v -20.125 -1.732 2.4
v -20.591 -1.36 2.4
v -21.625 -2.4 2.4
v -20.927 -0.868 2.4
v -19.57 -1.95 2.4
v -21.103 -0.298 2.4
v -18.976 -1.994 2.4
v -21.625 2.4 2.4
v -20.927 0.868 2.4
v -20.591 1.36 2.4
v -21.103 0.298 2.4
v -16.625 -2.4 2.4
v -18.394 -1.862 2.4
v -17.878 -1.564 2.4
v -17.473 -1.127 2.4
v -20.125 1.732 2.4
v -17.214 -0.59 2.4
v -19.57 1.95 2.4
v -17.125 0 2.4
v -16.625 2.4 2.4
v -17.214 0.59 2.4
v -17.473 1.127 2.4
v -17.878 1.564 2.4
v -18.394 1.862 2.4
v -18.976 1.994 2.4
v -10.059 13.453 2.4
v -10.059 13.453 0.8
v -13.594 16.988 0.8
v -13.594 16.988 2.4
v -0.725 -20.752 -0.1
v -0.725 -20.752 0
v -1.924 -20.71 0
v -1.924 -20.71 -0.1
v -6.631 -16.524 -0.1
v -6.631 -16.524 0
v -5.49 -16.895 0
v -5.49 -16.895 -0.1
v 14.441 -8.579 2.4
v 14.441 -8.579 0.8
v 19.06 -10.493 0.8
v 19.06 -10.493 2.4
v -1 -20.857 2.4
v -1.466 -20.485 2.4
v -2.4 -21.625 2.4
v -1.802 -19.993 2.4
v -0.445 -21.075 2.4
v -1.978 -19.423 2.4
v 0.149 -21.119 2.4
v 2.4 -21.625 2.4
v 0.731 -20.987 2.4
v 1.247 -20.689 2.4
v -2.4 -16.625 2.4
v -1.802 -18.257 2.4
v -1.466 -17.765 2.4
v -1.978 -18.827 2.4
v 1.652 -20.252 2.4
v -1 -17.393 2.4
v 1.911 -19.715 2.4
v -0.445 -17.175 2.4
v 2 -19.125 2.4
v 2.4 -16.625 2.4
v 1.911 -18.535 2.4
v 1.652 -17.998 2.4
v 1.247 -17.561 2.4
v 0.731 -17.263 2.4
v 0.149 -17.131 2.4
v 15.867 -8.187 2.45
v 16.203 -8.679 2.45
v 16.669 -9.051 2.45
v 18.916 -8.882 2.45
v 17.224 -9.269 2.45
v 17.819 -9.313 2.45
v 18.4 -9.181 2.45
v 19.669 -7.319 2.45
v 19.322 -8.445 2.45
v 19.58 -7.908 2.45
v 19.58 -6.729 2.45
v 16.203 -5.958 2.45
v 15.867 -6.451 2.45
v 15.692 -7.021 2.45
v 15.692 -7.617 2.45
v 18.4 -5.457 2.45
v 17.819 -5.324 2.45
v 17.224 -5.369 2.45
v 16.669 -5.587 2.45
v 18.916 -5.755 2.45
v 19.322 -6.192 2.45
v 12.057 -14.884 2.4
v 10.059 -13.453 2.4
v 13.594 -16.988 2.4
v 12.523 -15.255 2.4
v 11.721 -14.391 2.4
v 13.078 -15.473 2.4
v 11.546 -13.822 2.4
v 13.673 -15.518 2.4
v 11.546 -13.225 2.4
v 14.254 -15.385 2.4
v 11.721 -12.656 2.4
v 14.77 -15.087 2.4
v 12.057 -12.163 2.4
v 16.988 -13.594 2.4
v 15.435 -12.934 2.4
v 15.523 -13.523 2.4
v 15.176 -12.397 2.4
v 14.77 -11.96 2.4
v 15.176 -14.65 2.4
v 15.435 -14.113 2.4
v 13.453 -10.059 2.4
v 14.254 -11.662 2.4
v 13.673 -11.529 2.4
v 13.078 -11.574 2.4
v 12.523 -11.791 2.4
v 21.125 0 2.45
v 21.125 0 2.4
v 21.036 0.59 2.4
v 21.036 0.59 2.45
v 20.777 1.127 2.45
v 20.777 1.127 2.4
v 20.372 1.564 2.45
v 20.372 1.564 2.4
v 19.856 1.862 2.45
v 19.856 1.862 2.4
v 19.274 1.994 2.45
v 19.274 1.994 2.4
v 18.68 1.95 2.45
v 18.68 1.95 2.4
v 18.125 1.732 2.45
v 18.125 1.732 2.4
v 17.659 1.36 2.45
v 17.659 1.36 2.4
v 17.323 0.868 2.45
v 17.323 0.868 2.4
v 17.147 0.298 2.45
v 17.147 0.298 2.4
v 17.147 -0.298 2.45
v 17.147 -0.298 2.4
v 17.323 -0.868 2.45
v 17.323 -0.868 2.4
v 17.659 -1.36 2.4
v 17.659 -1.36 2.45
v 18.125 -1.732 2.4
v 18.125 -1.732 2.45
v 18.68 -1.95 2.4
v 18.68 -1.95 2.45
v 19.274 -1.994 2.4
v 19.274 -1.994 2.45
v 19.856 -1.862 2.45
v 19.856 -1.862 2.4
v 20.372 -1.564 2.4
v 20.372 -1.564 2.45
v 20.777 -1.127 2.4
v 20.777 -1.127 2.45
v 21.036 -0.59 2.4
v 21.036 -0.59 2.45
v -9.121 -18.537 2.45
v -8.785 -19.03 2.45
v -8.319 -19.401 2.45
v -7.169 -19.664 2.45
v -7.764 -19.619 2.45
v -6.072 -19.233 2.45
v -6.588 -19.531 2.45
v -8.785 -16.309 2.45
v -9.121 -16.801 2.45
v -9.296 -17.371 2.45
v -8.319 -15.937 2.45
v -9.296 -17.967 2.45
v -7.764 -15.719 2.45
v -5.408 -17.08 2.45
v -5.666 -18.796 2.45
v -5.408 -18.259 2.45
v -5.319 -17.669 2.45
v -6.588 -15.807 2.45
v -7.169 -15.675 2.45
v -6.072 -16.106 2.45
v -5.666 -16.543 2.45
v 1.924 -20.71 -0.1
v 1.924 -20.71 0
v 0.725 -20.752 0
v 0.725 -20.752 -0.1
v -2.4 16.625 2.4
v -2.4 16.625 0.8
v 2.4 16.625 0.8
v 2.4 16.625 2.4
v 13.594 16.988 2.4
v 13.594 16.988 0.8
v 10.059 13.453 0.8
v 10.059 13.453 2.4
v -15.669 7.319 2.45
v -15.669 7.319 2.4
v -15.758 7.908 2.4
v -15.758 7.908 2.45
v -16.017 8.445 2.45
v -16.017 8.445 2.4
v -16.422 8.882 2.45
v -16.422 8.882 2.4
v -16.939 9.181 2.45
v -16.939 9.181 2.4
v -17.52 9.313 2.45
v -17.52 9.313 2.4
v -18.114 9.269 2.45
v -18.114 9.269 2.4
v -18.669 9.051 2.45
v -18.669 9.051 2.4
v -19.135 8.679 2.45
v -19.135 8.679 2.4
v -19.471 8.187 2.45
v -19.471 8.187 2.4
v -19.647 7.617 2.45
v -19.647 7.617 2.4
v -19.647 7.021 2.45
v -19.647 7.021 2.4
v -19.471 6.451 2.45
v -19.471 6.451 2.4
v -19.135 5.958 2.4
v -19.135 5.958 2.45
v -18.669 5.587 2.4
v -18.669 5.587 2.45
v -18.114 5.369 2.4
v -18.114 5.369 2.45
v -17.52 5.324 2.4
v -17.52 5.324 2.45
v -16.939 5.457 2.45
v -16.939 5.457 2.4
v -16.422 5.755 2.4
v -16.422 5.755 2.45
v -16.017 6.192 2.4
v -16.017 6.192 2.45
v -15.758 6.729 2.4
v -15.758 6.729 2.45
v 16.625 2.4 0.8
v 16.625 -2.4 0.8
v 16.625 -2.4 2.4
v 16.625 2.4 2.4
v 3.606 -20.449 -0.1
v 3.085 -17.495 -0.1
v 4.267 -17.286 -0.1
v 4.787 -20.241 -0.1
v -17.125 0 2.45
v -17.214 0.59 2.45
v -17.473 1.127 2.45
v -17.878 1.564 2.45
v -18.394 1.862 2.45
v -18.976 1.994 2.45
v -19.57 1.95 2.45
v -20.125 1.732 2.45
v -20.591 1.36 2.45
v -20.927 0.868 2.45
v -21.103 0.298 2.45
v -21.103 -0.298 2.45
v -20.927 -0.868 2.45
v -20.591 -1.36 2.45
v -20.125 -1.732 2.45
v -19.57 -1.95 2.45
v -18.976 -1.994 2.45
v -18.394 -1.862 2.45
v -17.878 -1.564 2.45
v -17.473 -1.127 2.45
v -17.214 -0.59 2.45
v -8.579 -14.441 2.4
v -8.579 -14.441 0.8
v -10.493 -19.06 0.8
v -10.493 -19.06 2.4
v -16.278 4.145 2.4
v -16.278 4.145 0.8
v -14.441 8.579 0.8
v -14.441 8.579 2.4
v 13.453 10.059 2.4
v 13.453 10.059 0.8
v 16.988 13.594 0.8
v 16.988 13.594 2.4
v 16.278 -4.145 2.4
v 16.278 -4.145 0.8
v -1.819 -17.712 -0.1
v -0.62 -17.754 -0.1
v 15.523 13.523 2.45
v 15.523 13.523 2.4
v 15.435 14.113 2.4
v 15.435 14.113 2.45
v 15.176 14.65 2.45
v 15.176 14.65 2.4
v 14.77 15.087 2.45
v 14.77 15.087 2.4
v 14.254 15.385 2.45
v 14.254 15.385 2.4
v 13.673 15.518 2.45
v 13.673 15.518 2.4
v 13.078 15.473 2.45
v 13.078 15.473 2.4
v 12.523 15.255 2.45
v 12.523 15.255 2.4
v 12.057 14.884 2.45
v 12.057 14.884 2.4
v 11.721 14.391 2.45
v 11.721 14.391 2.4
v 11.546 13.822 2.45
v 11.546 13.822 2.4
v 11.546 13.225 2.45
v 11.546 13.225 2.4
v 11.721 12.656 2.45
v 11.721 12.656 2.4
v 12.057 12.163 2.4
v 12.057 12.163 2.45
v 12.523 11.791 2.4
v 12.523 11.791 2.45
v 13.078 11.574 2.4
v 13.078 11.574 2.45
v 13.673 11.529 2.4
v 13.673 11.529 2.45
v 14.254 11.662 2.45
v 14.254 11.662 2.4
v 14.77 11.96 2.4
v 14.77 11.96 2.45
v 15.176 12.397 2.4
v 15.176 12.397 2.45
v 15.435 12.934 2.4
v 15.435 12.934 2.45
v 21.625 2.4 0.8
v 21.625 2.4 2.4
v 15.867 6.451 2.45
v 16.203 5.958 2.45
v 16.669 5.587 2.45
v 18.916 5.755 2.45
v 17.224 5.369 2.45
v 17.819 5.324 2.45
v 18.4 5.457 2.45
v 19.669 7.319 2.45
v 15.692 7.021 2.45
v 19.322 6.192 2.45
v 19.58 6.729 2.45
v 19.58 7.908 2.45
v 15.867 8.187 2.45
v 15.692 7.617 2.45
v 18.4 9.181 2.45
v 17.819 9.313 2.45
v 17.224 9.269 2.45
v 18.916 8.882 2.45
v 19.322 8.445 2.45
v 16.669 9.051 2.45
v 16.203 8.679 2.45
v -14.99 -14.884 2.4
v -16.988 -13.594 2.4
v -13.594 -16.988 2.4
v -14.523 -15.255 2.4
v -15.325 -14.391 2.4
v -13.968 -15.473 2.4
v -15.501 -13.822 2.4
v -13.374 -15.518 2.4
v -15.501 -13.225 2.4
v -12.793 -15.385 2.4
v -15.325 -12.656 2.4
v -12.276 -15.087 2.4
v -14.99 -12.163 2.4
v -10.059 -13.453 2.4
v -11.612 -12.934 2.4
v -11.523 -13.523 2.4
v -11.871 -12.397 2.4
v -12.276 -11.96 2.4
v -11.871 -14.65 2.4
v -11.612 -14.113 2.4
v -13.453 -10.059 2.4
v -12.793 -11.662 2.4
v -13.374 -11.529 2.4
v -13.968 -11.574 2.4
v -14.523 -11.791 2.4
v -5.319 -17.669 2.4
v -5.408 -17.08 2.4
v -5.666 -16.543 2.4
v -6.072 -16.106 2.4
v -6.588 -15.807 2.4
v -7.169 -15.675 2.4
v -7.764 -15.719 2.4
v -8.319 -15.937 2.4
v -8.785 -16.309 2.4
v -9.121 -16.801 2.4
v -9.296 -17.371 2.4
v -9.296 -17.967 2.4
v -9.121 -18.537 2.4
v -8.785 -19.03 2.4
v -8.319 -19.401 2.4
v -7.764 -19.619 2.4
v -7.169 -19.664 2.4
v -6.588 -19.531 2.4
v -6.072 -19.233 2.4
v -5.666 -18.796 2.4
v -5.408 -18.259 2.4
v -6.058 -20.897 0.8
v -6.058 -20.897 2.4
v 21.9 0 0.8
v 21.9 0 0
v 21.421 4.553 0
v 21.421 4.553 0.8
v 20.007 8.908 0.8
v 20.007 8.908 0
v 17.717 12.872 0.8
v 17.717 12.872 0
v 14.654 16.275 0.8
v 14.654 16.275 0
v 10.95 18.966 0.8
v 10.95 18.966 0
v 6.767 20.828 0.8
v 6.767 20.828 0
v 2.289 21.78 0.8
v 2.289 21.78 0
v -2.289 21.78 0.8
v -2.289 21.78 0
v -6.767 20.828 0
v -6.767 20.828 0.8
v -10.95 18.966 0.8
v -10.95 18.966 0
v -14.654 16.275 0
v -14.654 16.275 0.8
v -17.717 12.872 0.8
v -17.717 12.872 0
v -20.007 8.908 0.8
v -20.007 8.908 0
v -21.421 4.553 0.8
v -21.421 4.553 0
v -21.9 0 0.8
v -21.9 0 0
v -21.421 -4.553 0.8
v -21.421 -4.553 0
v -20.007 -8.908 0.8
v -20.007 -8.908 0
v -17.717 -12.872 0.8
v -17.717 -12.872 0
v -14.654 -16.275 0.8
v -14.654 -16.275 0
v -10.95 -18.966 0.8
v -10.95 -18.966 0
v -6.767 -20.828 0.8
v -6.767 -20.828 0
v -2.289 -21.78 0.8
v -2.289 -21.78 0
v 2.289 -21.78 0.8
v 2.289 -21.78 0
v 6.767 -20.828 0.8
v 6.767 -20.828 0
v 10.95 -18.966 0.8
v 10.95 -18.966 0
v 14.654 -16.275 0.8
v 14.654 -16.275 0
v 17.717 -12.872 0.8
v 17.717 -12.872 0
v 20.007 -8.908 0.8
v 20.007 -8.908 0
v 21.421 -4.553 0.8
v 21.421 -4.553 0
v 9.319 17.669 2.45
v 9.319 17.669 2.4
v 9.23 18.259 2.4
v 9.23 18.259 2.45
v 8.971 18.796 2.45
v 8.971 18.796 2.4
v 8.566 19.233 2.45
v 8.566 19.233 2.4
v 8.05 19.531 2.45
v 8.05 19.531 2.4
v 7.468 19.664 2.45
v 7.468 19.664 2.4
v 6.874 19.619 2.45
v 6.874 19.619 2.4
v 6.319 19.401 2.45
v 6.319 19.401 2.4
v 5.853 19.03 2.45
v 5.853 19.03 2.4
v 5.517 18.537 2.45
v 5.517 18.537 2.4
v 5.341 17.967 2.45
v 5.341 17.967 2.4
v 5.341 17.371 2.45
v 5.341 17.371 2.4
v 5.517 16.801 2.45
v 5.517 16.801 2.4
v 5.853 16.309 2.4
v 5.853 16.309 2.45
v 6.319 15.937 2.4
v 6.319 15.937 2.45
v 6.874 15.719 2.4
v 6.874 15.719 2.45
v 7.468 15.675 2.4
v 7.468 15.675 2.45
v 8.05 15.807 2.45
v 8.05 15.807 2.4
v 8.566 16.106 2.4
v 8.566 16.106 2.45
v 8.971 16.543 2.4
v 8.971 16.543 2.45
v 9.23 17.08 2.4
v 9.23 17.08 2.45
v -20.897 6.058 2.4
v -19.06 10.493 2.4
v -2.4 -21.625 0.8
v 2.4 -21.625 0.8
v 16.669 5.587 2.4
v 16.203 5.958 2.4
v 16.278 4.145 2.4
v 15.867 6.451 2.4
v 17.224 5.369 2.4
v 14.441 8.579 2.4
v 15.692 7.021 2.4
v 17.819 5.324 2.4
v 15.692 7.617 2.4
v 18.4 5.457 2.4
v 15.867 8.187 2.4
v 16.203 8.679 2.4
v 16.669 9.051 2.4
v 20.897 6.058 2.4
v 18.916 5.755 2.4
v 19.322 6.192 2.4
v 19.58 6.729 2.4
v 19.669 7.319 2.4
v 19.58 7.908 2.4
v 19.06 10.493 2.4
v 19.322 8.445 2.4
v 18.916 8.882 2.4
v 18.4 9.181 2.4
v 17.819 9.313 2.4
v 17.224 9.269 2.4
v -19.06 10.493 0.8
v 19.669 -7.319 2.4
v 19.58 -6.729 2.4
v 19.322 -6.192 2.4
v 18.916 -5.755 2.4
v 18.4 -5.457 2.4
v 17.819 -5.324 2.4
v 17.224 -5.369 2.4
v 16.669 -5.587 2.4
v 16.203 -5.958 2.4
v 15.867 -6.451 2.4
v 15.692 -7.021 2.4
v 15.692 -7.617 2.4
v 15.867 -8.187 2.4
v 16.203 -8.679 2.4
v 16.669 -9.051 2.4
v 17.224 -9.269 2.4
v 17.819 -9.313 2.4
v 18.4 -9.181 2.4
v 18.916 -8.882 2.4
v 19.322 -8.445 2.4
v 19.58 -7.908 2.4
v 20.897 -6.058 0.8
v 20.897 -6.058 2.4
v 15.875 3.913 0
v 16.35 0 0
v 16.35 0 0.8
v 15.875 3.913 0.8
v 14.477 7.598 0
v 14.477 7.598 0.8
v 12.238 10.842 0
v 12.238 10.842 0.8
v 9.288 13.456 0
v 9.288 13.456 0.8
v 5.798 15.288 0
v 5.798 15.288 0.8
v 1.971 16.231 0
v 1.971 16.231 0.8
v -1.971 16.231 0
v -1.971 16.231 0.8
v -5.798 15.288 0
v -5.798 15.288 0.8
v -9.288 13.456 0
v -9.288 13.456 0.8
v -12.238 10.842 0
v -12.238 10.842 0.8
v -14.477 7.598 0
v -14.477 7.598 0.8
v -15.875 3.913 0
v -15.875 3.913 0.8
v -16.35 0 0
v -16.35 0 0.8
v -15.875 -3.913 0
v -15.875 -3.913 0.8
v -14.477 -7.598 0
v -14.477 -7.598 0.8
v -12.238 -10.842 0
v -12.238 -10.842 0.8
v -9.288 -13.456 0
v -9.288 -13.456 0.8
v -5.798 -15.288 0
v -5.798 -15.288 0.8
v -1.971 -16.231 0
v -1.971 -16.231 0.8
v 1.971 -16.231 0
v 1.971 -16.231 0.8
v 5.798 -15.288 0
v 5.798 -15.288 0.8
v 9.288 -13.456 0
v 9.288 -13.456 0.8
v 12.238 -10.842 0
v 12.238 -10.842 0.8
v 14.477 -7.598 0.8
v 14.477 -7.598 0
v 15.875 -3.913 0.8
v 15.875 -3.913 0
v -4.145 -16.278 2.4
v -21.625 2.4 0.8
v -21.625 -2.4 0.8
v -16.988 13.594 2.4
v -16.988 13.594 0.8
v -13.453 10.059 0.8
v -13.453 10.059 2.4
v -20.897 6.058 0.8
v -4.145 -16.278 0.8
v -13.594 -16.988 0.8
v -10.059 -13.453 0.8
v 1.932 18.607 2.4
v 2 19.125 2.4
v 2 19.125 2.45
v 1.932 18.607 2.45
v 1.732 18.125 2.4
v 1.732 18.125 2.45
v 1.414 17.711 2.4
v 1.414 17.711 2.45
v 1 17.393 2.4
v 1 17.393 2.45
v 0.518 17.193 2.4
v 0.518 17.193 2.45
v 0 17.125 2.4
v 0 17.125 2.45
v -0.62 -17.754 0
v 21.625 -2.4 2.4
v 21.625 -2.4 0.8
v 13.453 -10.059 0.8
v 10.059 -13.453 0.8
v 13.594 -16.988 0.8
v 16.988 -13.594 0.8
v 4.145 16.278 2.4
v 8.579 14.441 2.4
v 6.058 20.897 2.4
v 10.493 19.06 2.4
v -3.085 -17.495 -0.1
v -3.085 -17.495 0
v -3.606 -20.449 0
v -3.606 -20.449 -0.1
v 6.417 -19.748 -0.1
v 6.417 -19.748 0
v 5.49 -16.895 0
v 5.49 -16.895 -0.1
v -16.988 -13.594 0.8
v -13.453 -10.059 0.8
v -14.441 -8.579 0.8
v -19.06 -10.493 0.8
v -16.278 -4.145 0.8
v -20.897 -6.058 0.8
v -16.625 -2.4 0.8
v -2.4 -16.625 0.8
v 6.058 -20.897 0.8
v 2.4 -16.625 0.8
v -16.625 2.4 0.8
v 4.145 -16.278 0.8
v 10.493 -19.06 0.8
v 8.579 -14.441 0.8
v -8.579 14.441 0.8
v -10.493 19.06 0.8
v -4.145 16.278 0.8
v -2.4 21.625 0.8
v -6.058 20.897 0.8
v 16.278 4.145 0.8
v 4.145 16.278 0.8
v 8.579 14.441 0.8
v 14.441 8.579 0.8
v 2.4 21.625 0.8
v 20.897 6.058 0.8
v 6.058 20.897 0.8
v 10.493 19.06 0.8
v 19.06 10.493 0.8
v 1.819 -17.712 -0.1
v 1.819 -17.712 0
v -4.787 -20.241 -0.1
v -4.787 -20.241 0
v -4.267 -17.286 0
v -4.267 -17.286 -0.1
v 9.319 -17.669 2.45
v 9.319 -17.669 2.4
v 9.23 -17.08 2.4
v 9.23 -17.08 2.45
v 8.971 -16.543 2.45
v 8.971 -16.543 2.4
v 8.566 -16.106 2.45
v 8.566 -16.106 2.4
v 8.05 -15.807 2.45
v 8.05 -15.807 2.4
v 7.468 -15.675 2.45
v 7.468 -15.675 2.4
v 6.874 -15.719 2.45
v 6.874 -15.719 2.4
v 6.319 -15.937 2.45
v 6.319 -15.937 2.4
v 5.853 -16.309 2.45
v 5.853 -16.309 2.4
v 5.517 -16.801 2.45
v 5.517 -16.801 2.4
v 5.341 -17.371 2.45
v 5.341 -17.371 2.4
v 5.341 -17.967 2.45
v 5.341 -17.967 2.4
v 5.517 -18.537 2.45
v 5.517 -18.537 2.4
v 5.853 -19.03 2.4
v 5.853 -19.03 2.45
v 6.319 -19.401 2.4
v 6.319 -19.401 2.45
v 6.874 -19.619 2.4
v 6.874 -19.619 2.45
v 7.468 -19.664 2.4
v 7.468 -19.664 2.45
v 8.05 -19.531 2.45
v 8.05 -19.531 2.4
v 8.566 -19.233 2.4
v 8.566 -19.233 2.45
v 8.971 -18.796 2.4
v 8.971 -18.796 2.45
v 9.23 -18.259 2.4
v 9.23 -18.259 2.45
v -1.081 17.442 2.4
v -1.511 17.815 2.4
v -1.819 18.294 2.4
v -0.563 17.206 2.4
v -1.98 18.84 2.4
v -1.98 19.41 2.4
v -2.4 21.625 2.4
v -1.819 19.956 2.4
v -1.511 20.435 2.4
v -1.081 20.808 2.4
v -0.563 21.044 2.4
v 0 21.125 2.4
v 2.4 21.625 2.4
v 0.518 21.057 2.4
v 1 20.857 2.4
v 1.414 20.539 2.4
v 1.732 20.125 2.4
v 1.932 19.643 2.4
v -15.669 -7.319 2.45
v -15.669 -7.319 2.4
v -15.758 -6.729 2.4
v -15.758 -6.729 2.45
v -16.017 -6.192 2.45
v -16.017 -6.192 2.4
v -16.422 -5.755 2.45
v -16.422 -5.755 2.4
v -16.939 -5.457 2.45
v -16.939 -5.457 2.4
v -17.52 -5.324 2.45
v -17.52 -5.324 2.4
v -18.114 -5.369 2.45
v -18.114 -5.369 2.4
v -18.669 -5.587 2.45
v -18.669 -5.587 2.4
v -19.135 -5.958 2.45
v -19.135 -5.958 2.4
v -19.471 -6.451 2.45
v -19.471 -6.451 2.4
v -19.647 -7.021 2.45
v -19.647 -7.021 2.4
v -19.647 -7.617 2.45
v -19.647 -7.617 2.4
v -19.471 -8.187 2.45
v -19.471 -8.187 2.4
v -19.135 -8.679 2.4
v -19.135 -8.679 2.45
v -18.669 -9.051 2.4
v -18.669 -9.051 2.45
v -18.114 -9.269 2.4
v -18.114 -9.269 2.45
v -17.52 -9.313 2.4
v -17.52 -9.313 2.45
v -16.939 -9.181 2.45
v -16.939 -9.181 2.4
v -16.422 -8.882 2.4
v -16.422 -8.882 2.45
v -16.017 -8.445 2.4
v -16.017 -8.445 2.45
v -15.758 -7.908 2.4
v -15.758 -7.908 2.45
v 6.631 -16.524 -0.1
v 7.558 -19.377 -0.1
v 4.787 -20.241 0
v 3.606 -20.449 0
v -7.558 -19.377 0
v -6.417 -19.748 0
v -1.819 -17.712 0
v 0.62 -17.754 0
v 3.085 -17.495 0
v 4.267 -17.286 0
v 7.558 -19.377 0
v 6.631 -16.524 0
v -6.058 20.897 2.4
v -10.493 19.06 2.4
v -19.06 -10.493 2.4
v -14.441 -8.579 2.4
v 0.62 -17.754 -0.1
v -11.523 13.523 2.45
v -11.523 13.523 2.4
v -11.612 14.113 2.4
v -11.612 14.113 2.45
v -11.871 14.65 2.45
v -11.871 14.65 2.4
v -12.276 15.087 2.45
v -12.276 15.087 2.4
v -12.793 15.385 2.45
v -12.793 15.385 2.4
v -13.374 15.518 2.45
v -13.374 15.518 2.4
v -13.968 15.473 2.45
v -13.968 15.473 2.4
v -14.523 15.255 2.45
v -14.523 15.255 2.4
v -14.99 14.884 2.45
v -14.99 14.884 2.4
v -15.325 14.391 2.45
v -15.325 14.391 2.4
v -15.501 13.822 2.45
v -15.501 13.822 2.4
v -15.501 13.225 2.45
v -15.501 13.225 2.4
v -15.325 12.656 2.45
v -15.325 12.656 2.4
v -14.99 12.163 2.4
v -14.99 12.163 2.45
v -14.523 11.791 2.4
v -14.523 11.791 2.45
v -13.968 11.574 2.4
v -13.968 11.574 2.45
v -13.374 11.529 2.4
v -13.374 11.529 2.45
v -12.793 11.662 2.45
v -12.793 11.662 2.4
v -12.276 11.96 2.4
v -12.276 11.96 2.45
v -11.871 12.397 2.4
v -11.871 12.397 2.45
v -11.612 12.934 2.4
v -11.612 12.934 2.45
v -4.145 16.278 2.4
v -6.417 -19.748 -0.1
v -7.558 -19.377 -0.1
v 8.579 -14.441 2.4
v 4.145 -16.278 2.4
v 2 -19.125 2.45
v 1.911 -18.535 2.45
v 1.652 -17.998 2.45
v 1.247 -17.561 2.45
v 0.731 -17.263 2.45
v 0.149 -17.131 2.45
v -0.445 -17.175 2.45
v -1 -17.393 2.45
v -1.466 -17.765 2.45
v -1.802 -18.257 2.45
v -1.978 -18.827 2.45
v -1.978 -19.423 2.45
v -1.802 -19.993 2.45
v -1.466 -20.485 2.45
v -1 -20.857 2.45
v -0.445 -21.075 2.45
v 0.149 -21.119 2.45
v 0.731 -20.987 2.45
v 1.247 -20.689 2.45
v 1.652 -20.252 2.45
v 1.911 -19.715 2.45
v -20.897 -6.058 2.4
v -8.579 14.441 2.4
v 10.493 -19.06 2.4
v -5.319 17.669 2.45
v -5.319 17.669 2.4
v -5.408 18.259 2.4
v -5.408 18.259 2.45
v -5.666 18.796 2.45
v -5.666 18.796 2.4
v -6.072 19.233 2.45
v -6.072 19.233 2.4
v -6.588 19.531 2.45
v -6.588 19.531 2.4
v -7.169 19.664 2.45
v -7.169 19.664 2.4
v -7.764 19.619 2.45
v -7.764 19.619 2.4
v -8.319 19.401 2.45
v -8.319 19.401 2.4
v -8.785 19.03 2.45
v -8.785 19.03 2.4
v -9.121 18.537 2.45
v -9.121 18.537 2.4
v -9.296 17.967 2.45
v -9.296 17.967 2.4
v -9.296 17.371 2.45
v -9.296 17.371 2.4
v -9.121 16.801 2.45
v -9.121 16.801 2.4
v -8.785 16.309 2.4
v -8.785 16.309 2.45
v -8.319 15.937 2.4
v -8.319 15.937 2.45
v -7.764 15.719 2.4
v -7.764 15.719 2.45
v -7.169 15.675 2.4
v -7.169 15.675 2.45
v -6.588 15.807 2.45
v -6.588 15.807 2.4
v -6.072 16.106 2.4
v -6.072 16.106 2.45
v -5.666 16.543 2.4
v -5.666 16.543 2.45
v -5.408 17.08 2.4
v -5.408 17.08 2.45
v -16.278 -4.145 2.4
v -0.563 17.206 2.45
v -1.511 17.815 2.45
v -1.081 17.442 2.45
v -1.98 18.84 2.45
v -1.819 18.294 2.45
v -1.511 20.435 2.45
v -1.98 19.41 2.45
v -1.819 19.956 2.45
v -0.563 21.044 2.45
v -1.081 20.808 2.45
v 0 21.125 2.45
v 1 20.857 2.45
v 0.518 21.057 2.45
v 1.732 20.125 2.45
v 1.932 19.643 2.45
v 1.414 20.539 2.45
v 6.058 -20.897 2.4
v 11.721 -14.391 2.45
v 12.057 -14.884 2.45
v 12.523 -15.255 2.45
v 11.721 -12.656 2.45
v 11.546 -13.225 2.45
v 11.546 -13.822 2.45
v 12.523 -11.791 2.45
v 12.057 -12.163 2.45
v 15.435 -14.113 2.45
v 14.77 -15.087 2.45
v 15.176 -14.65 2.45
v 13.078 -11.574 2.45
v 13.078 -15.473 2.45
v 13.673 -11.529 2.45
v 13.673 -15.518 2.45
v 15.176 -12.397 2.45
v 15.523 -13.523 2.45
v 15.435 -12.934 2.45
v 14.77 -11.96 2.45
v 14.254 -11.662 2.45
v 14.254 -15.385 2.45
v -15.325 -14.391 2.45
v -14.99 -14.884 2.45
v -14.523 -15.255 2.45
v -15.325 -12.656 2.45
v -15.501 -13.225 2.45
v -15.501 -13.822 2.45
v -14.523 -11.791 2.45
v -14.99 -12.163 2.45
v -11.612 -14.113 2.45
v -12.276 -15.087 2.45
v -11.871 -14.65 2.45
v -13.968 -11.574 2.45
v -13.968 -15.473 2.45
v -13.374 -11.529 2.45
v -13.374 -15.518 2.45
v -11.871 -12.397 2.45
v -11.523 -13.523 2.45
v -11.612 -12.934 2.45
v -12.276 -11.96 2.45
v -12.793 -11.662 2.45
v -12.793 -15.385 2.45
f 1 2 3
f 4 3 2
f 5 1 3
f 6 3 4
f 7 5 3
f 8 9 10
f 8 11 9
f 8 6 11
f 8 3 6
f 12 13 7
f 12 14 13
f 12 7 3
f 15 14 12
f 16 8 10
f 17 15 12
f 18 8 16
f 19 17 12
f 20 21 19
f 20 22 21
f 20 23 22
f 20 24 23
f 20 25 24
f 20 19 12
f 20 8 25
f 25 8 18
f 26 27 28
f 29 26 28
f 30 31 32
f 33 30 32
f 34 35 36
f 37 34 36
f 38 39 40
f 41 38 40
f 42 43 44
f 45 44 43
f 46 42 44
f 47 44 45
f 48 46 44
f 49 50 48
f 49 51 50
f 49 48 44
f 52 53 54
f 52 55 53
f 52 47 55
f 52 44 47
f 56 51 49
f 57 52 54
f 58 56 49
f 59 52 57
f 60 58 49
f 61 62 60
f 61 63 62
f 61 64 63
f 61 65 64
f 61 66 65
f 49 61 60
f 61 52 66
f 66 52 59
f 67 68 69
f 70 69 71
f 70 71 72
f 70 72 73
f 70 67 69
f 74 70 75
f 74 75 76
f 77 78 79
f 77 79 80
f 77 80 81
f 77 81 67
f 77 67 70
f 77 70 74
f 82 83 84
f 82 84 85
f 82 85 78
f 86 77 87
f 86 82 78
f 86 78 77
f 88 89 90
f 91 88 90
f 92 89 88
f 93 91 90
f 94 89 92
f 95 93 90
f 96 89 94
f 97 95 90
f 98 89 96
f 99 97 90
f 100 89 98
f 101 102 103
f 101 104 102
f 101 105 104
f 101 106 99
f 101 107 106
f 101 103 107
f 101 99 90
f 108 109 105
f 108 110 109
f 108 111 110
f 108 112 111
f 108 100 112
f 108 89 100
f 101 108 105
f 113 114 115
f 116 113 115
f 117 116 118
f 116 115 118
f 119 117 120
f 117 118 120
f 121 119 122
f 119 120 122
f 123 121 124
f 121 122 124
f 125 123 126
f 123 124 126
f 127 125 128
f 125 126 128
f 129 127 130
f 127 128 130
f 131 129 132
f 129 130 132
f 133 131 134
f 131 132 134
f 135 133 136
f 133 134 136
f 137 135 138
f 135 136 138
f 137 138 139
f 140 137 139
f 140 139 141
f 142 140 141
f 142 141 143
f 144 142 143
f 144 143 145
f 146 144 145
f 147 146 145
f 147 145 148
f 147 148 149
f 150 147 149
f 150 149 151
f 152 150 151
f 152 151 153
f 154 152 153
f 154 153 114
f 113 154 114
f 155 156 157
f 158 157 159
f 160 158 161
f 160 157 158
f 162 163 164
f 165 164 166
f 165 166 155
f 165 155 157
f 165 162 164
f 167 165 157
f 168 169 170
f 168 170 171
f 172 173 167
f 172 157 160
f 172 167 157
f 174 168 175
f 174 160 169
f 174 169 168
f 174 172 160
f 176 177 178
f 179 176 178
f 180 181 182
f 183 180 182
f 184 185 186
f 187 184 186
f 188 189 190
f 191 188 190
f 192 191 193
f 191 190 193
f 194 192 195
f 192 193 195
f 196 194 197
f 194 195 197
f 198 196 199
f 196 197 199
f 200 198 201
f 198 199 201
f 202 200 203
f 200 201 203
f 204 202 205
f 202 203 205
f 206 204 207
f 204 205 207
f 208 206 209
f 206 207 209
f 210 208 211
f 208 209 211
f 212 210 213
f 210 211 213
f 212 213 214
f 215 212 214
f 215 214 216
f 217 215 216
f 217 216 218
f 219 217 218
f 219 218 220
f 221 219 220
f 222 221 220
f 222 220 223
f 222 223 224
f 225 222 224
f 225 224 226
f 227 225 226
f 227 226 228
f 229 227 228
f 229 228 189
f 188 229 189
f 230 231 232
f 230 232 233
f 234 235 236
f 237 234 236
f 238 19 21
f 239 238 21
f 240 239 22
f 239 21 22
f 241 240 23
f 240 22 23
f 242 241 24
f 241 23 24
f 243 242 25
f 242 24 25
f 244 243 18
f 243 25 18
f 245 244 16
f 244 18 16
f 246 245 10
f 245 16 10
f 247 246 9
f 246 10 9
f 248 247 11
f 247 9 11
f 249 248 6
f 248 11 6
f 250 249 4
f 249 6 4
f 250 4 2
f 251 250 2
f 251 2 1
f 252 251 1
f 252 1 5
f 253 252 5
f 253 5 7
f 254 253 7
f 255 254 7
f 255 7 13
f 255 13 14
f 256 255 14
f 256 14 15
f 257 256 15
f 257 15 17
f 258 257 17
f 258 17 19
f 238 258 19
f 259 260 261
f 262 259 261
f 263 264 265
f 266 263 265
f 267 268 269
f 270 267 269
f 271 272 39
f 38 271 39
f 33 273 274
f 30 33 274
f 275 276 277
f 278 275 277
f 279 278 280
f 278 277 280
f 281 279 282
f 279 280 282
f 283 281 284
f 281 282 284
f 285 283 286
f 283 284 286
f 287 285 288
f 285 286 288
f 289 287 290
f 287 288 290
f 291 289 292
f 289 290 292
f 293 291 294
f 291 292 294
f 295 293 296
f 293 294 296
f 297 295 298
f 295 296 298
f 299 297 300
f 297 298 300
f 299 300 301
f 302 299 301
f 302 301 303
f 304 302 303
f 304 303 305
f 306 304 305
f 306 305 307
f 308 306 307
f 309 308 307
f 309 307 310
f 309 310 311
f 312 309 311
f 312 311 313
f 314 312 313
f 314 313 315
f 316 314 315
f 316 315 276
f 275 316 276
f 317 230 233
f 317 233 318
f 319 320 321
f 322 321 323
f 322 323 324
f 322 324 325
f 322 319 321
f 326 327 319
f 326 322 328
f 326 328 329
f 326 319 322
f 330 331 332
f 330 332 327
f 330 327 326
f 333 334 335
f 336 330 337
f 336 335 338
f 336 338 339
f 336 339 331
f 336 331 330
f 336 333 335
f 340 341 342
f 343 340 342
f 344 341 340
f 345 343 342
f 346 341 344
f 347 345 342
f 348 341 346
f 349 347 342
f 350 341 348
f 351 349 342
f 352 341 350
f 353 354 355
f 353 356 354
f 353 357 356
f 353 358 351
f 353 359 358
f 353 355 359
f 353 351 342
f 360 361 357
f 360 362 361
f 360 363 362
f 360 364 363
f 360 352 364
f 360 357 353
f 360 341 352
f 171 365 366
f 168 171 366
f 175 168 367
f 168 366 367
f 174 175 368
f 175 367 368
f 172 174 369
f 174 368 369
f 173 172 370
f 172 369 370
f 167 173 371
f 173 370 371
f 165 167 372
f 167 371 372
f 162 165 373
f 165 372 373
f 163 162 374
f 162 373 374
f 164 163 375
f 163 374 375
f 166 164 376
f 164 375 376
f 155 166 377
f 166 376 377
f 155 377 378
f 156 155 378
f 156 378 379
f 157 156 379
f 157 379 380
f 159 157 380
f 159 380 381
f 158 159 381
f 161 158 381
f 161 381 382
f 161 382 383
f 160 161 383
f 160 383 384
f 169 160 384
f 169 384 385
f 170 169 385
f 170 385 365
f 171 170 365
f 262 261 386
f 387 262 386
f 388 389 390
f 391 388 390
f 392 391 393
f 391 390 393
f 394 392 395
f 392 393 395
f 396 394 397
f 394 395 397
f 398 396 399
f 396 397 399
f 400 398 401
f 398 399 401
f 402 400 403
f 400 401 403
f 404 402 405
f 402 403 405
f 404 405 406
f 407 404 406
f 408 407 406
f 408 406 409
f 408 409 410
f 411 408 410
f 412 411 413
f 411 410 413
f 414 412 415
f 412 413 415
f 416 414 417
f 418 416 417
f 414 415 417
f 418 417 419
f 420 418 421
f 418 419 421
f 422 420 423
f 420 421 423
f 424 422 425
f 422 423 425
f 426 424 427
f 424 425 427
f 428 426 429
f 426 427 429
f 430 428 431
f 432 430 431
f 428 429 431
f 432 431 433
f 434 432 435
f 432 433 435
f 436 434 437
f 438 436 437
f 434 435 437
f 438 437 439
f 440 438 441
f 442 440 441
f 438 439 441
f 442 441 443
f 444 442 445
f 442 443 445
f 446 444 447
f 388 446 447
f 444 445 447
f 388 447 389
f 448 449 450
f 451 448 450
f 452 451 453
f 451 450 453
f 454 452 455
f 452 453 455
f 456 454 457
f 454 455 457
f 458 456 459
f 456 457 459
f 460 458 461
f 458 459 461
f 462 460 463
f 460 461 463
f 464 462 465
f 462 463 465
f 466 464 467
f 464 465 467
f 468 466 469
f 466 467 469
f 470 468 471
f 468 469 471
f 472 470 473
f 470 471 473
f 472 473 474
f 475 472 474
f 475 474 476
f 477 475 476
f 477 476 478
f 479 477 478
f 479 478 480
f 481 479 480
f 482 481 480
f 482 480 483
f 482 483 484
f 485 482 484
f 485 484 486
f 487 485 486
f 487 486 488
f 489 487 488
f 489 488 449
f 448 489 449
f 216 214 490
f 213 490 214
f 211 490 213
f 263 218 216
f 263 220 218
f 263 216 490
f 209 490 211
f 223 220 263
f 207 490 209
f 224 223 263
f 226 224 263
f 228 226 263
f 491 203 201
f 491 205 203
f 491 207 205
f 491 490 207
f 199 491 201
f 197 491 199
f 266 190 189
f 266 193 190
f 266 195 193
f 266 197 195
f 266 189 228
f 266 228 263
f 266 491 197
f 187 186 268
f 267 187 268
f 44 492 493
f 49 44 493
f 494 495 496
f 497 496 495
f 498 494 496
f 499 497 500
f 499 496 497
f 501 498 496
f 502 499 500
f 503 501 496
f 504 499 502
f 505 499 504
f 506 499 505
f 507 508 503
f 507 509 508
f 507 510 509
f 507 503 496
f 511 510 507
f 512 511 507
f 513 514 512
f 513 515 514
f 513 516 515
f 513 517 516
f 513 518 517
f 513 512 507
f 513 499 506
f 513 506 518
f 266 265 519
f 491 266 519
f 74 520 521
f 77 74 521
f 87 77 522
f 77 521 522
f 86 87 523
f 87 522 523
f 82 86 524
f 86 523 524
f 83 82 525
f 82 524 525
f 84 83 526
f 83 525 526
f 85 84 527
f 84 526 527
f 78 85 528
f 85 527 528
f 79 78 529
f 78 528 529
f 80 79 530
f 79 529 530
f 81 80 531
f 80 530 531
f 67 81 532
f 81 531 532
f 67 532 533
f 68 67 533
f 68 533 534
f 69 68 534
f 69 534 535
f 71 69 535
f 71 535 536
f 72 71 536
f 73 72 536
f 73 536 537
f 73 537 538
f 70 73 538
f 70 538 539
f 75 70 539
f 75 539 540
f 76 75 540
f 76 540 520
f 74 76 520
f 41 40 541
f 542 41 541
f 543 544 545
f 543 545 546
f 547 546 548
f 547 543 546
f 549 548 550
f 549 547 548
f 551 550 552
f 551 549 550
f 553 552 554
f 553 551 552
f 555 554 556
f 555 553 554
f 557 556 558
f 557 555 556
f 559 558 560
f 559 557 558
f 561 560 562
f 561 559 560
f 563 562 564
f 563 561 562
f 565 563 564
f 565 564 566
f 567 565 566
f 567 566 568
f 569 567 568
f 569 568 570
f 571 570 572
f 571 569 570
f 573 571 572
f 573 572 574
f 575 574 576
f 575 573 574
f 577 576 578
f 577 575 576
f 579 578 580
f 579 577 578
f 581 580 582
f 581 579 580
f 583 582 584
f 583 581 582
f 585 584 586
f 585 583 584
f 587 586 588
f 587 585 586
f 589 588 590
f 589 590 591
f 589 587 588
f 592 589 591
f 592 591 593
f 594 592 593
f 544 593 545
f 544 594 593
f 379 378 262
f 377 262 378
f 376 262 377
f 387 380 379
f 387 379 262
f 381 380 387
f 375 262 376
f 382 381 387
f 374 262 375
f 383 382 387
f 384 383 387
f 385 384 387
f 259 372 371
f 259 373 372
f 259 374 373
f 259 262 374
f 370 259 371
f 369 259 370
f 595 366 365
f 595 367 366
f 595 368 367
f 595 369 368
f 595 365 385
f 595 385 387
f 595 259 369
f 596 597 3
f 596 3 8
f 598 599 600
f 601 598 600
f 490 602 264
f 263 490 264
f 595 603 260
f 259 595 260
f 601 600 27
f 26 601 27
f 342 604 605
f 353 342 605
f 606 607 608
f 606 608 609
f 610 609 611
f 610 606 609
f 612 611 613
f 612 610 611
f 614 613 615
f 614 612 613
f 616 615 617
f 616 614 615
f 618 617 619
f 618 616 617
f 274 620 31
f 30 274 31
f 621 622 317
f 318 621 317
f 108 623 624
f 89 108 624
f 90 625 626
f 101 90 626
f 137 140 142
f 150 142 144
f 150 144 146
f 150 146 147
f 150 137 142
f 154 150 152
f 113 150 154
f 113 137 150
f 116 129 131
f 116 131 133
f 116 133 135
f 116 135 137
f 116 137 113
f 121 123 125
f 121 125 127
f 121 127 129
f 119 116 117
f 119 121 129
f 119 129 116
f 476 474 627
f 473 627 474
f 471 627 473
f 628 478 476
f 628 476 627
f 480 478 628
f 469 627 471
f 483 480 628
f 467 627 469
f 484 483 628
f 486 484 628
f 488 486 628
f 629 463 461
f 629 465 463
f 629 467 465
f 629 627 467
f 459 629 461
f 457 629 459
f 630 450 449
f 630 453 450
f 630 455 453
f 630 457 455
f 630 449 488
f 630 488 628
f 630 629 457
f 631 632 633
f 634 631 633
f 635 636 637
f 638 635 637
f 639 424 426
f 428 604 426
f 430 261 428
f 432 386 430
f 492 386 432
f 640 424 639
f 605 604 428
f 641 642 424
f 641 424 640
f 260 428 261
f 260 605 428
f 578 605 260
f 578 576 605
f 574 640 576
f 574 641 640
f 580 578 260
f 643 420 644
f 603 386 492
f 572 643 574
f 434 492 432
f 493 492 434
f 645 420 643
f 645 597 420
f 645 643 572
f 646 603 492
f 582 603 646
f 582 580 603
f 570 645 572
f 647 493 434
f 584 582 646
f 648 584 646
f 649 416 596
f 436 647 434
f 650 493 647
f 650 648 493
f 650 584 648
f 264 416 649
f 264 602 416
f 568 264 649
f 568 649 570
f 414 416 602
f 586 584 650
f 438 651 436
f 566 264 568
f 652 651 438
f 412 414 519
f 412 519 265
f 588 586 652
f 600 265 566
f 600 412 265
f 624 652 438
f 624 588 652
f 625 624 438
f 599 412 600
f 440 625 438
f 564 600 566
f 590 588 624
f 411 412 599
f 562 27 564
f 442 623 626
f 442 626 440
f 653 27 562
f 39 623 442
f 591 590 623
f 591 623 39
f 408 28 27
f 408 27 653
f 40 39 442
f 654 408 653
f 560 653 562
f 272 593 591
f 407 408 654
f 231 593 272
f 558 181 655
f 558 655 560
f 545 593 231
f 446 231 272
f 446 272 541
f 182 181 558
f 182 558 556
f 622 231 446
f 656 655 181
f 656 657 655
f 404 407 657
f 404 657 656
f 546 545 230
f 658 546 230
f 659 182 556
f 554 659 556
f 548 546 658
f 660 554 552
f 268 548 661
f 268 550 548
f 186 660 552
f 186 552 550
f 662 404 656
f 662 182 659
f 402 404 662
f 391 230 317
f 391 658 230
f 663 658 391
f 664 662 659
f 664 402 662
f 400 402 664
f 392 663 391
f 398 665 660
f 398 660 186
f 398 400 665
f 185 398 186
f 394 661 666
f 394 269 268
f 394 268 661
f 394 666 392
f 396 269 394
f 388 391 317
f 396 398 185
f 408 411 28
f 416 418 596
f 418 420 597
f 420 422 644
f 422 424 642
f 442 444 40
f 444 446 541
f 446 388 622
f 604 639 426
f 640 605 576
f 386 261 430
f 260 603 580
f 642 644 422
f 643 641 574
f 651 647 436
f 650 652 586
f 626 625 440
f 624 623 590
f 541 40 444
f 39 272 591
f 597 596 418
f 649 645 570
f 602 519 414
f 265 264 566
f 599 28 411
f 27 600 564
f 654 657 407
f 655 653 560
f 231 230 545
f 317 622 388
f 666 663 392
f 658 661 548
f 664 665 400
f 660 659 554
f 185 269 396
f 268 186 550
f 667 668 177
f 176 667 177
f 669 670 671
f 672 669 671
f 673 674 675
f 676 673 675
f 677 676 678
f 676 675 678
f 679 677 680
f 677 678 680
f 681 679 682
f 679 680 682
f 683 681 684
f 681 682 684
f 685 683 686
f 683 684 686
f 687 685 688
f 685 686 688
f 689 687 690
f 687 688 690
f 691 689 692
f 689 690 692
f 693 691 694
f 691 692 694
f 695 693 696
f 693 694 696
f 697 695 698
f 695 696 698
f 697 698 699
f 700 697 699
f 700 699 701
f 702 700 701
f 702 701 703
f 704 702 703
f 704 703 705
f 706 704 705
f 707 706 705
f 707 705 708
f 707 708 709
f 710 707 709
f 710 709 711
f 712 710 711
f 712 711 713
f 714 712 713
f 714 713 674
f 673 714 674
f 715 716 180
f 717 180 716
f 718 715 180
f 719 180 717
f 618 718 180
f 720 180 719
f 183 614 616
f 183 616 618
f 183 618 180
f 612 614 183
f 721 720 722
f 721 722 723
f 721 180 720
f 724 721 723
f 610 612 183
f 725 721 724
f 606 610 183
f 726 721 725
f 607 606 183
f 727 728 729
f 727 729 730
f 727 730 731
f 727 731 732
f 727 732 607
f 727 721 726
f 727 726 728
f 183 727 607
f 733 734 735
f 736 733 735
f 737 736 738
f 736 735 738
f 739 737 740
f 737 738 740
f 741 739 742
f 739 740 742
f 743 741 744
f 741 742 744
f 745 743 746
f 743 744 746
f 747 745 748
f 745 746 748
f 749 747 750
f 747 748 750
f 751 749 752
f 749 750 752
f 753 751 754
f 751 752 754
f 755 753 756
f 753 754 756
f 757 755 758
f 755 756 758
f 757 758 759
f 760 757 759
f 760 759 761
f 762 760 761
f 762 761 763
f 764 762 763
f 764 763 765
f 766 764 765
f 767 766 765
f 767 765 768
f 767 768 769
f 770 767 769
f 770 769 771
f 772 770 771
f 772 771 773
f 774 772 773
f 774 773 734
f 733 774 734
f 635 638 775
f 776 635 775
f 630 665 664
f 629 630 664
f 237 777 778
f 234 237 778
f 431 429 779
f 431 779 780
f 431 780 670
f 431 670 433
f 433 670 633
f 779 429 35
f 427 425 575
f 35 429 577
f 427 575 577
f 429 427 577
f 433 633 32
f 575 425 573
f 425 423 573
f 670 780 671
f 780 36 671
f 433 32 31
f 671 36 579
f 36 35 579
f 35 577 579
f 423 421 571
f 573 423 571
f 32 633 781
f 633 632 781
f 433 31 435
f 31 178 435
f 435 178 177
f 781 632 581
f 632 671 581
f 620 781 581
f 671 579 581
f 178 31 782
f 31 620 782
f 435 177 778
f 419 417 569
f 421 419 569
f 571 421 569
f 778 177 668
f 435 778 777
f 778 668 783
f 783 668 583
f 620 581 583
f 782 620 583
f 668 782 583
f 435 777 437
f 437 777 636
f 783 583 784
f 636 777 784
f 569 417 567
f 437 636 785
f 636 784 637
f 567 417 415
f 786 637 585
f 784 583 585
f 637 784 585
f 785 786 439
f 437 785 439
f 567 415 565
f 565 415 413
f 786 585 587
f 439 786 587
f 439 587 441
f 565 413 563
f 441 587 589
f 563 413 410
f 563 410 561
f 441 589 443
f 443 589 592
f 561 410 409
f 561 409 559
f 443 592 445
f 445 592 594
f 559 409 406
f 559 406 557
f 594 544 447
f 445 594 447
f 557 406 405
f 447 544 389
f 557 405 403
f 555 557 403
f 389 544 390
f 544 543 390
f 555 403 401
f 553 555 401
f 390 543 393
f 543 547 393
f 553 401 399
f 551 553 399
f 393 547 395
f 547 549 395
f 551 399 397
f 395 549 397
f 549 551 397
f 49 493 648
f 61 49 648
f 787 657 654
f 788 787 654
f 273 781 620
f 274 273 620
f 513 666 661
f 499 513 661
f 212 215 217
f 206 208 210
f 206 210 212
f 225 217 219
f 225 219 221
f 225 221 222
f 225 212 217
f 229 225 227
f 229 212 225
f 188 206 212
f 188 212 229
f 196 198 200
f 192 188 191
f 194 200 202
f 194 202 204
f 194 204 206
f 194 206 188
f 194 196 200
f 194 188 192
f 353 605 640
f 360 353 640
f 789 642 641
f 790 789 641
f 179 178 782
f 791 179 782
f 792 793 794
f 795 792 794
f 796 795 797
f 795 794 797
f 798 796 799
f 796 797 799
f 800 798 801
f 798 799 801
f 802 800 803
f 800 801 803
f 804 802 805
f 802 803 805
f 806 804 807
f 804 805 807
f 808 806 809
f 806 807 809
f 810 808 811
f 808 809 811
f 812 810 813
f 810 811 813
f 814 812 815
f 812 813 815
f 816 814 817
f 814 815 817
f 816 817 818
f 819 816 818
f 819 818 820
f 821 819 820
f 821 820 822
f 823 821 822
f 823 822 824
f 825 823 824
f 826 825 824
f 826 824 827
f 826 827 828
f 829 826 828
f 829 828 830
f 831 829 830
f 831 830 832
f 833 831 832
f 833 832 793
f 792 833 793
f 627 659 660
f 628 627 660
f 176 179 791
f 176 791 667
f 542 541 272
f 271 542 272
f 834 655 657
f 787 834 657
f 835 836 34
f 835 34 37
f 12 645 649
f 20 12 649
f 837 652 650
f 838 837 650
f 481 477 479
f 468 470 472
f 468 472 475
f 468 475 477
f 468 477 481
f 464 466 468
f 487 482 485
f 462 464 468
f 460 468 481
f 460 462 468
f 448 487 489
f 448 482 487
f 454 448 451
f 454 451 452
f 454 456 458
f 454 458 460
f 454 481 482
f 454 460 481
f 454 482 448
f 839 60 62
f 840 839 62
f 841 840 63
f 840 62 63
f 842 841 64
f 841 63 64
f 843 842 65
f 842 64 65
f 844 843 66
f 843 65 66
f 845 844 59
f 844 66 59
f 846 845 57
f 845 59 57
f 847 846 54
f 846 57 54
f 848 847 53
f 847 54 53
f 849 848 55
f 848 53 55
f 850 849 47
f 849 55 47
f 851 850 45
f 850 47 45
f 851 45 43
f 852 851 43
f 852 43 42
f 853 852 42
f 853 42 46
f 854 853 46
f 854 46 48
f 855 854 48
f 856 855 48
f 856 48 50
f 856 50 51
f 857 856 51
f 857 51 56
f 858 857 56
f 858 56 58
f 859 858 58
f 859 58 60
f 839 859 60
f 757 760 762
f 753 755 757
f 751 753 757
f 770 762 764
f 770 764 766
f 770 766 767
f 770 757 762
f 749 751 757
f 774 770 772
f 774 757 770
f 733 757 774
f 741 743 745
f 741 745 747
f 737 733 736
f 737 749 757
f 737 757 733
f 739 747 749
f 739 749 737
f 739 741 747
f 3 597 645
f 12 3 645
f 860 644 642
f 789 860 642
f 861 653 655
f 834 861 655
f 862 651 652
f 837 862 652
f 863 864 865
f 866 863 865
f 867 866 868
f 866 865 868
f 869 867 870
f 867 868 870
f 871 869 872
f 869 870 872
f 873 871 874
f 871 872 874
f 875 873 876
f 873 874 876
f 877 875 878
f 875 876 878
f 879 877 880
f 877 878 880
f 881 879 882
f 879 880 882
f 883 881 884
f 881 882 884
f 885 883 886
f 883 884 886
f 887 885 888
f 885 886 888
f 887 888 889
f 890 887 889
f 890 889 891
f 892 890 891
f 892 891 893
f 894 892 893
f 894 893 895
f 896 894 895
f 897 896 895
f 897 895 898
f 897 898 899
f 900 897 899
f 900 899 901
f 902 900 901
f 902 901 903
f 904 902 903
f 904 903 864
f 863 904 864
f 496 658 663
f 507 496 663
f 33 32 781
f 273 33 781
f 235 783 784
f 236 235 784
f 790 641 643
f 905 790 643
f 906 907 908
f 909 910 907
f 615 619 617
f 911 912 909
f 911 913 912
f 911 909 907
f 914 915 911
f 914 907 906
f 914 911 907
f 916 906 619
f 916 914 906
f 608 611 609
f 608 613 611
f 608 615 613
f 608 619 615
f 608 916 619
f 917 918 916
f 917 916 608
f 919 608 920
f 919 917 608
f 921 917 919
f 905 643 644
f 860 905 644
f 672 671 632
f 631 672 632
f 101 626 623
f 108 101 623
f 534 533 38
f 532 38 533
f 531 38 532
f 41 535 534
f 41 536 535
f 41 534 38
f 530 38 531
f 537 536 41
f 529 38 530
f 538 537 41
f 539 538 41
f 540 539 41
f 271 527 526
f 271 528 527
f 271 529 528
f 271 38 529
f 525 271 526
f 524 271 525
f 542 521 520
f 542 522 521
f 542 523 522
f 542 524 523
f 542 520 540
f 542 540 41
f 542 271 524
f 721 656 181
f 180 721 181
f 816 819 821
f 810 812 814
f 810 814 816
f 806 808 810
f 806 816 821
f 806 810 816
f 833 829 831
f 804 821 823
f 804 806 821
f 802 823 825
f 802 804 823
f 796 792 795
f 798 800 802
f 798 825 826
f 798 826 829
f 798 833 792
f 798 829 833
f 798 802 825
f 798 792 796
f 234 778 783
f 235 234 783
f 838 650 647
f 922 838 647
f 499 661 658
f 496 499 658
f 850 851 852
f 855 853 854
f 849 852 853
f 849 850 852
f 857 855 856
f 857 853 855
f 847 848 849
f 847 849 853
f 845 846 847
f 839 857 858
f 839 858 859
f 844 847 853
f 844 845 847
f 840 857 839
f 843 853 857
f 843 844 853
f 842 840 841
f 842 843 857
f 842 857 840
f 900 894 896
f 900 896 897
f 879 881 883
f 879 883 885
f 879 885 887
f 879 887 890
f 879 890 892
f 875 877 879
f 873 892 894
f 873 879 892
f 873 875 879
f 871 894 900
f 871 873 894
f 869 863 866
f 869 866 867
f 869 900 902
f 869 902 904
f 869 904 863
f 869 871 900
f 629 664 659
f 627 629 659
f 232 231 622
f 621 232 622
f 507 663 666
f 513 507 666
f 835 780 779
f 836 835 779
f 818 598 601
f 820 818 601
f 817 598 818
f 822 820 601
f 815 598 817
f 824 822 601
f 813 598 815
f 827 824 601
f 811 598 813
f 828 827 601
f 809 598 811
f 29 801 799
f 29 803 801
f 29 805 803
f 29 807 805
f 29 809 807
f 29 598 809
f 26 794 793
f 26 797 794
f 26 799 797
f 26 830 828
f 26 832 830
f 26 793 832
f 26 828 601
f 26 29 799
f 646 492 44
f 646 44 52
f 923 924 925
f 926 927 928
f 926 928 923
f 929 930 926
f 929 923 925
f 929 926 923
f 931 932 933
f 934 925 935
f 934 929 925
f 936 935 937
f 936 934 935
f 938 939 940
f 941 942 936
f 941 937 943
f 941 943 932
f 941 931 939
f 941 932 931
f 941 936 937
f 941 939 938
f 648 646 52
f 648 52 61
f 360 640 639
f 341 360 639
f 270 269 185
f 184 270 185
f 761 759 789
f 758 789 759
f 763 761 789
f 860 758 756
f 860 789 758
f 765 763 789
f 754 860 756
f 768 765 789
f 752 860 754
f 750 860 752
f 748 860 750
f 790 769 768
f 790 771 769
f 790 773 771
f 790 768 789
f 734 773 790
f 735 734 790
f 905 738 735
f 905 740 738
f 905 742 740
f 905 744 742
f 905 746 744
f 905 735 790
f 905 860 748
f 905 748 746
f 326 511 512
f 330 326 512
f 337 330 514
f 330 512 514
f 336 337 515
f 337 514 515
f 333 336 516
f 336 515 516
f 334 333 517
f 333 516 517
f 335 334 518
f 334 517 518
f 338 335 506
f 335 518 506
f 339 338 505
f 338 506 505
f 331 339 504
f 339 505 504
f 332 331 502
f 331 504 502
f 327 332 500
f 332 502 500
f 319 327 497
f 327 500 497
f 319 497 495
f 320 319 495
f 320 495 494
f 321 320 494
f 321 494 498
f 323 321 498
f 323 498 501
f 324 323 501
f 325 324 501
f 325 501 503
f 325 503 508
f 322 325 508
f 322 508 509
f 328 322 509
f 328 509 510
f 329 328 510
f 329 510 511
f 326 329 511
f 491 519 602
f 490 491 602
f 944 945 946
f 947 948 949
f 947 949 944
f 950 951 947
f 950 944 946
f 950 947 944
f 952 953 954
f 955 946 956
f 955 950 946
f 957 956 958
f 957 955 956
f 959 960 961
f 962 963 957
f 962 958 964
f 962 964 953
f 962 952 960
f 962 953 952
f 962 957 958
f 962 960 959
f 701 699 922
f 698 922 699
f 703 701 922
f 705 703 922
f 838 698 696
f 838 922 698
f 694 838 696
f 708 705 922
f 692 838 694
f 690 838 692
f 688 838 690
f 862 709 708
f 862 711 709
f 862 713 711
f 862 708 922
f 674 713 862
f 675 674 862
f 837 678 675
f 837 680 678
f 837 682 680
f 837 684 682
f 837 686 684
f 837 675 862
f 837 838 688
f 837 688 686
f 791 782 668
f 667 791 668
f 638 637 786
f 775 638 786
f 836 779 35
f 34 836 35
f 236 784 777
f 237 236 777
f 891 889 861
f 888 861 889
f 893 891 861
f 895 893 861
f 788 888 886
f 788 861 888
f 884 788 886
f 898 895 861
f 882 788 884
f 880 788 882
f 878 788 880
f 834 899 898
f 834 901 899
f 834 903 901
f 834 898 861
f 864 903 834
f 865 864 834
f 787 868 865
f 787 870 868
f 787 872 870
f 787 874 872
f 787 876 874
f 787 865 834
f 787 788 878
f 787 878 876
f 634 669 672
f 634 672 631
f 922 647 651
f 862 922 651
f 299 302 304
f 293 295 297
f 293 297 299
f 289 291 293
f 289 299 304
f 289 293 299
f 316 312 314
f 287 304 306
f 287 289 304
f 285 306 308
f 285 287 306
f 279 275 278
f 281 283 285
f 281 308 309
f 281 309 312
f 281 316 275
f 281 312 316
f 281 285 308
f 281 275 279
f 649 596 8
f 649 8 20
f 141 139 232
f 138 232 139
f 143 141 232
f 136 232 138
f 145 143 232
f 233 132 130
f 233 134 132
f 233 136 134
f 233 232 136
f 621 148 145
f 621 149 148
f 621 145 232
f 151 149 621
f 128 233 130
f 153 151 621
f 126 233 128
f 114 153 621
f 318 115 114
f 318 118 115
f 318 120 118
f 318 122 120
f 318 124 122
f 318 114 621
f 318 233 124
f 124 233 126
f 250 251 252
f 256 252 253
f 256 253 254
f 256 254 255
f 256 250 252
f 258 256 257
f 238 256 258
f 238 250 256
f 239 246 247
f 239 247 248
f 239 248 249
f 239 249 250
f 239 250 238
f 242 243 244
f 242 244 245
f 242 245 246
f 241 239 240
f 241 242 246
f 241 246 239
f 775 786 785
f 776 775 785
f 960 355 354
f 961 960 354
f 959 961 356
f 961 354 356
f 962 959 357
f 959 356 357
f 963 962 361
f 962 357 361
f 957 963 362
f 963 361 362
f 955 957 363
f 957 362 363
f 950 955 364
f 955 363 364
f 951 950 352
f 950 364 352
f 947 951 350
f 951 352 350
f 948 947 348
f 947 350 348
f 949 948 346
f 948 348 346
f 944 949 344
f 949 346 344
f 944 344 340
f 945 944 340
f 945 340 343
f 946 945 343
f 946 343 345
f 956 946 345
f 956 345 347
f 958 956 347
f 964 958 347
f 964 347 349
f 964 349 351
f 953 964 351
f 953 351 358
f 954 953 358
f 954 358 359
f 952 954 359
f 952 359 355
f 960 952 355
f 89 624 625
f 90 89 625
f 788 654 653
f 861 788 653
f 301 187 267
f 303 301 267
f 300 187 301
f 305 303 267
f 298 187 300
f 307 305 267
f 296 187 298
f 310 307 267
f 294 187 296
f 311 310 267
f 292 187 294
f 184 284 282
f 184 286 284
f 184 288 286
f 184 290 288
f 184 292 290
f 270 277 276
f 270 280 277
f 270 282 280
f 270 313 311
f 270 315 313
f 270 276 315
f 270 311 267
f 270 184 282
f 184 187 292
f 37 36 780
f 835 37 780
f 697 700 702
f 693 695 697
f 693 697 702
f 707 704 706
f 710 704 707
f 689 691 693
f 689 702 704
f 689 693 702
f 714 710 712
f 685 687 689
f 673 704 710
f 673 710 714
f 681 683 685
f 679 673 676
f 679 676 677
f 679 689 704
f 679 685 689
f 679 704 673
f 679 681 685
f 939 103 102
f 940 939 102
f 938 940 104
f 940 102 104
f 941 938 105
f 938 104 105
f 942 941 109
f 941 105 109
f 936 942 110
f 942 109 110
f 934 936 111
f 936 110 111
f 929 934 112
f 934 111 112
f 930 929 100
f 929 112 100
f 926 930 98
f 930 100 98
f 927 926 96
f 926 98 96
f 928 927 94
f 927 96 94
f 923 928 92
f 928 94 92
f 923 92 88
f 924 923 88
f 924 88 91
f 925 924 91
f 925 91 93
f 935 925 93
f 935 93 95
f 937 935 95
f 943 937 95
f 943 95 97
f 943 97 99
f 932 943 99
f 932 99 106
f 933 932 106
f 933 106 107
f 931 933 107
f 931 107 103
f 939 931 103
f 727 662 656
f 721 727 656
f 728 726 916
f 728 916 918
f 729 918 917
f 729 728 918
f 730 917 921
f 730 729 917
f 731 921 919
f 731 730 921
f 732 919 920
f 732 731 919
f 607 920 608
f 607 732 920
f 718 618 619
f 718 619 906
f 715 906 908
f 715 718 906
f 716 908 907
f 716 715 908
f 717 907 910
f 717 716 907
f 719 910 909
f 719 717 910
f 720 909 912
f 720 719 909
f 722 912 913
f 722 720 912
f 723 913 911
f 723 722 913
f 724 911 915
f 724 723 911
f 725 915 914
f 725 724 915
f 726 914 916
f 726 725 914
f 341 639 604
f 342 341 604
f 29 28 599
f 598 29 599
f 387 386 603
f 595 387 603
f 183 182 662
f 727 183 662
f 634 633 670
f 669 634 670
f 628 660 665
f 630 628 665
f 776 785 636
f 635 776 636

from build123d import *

# Parameters (mm, degrees)
F0_R     = 21.9
F0_R_2   = 16.35
F1_DEPTH = 0.8
F2_R     = 2
F2_W     = 5
F2_H     = 4.8
F2_W_2   = 4.8
F2_H_2   = 5
F3_DEPTH = 1.6
F4_DEPTH = 1.65
F6_DEPTH = 0.1


with BuildPart() as f1:
    # F0 (on Top) → F1 (new body)
    with BuildSketch(Plane.XY):
        Circle(F0_R)
        Circle(F0_R_2, mode=Mode.SUBTRACT)
    extrude(amount=F1_DEPTH)

    # F2 (on face) → F3 (join)
    with BuildSketch(Plane.XY.offset(0.8)):
        with BuildLine():
            Line((2.4, 21.625), (0, 21.625))
            Line((0, 21.625), (0, 21.125))
            ThreePointArc((0, 21.125), (1.4142135624, 20.5392135624), (2, 19.125))
            ThreePointArc((2, 19.125), (1.4142135624, 17.7107864376), (0, 17.125))
            Line((0, 17.125), (0, 16.625))
            Line((0, 16.625), (2.4, 16.625))
            Line((2.4, 16.625), (2.4, 21.625))
        make_face()
        with BuildLine():
            Line((0, 21.125), (0, 21.625))
            Line((0, 21.625), (-2.4, 21.625))
            Line((-2.4, 21.625), (-2.4, 16.625))
            Line((-2.4, 16.625), (0, 16.625))
            Line((0, 16.625), (0, 17.125))
            ThreePointArc((0, 17.125), (-2, 19.125), (0, 21.125))
        make_face()
        Polygon((-10.4928401029, 19.0604546529), (-8.5794229411, 14.4410569903), (-4.144801185, 16.2779374657), (-6.0582183469, 20.8973351282), align=None)
        with Locations((-7.318820644, 17.6691960593)):
            Circle(F2_R, mode=Mode.SUBTRACT)
        Polygon((-16.988240418, 13.5941278683), (-13.4527065121, 10.0585939624), (-10.0585939624, 13.4527065121), (-13.5941278683, 16.988240418), align=None)
        with Locations((-13.5234171902, 13.5234171902)):
            Circle(F2_R, mode=Mode.SUBTRACT)
        Polygon((-20.8973351282, 6.0582183469), (-16.2779374657, 4.144801185), (-14.4410569903, 8.5794229411), (-19.0604546529, 10.4928401029), align=None)
        with Locations((-17.6691960593, 7.318820644)):
            Circle(F2_R, mode=Mode.SUBTRACT)
        with Locations((-19.125, 0)):
            Rectangle(F2_W, F2_H)
        with Locations((-19.125, 0)):
            Circle(F2_R, mode=Mode.SUBTRACT)
        Polygon((-19.0604546529, -10.4928401029), (-14.4410569903, -8.5794229411), (-16.2779374657, -4.144801185), (-20.8973351282, -6.0582183469), align=None)
        with Locations((-17.6691960593, -7.318820644)):
            Circle(F2_R, mode=Mode.SUBTRACT)
        Polygon((-13.5941278683, -16.988240418), (-10.0585939624, -13.4527065121), (-13.4527065121, -10.0585939624), (-16.988240418, -13.5941278683), align=None)
        with Locations((-13.5234171902, -13.5234171902)):
            Circle(F2_R, mode=Mode.SUBTRACT)
        Polygon((-6.0582183469, -20.8973351282), (-4.144801185, -16.2779374657), (-8.5794229411, -14.4410569903), (-10.4928401029, -19.0604546529), align=None)
        with Locations((-7.318820644, -17.6691960593)):
            Circle(F2_R, mode=Mode.SUBTRACT)
        with Locations((0, -19.125)):
            Rectangle(F2_W_2, F2_H_2)
        with Locations((0, -19.125)):
            Circle(F2_R, mode=Mode.SUBTRACT)
        Polygon((10.4928401029, -19.0604546529), (8.5794229411, -14.4410569903), (4.144801185, -16.2779374657), (6.0582183469, -20.8973351282), align=None)
        with Locations((7.318820644, -17.6691960593)):
            Circle(F2_R, mode=Mode.SUBTRACT)
        Polygon((16.988240418, -13.5941278683), (13.4527065121, -10.0585939624), (10.0585939624, -13.4527065121), (13.5941278683, -16.988240418), align=None)
        with Locations((13.5234171902, -13.5234171902)):
            Circle(F2_R, mode=Mode.SUBTRACT)
        Polygon((20.8973351282, -6.0582183469), (16.2779374657, -4.144801185), (14.4410569903, -8.5794229411), (19.0604546529, -10.4928401029), align=None)
        with Locations((17.6691960593, -7.318820644)):
            Circle(F2_R, mode=Mode.SUBTRACT)
        with Locations((19.125, 0)):
            Rectangle(F2_W, F2_H)
        with Locations((19.125, 0)):
            Circle(F2_R, mode=Mode.SUBTRACT)
        Polygon((19.0604546529, 10.4928401029), (14.4410569903, 8.5794229411), (16.2779374657, 4.144801185), (20.8973351282, 6.0582183469), align=None)
        with Locations((17.6691960593, 7.318820644)):
            Circle(F2_R, mode=Mode.SUBTRACT)
        Polygon((13.5941278683, 16.988240418), (10.0585939624, 13.4527065121), (13.4527065121, 10.0585939624), (16.988240418, 13.5941278683), align=None)
        with Locations((13.5234171902, 13.5234171902)):
            Circle(F2_R, mode=Mode.SUBTRACT)
        Polygon((6.0582183469, 20.8973351282), (4.144801185, 16.2779374657), (8.5794229411, 14.4410569903), (10.4928401029, 19.0604546529), align=None)
        with Locations((7.318820644, 17.6691960593)):
            Circle(F2_R, mode=Mode.SUBTRACT)
    extrude(amount=F3_DEPTH)

    # F4 (add): faces of the model
    f4_faces = [f1.faces().sort_by_distance(p)[0] for p in [
        (-17.6691960593, 7.318820644, 0.8),
        (-13.5234171902, 13.5234171902, 0.8),
        (-7.318820644, 17.6691960593, 0.8),
        (0, 19.125, 0.8),
        (7.318820644, 17.6691960593, 0.8),
        (-19.125, 0, 0.8),
        (-17.6691960593, -7.318820644, 0.8),
        (-13.5234171902, -13.5234171902, 0.8),
        (-7.318820644, -17.6691960593, 0.8),
        (0, -19.125, 0.8),
        (7.318820644, -17.6691960593, 0.8),
        (13.5234171902, -13.5234171902, 0.8),
        (17.6691960593, -7.318820644, 0.8),
        (19.125, 0, 0.8),
        (13.5234171902, 13.5234171902, 0.8),
        (17.6691960593, 7.318820644, 0.8),
    ]]
    extrude(f4_faces, amount=F4_DEPTH)

    # F5 (on face) → F6 (join)
    with BuildSketch(Plane(origin=(0, 0, 0), x_dir=(1, 0, 0), z_dir=(0, 0, -1))):
        Polygon((7.557822985, 19.3773058048), (6.4165551654, 19.748126198), (5.4895041823, 16.8949566491), (6.6307720019, 16.5241362559), align=None)
        Polygon((1.9239364053, 20.7098801839), (0.7246674128, 20.75175958), (0.6199689227, 17.7535870989), (1.8192379152, 17.7117077029), align=None)
        Polygon((4.7874710341, 20.240572858), (3.6057017305, 20.4489506712), (3.0847571975, 17.4945274122), (4.2665265011, 17.286149599), align=None)
        Polygon((-0.6199689227, 17.7535870989), (-0.7246674128, 20.75175958), (-1.9239364053, 20.7098801839), (-1.8192379152, 17.7117077029), align=None)
        Polygon((-3.0847571975, 17.4945274122), (-3.6057017305, 20.4489506712), (-4.7874710341, 20.240572858), (-4.2665265011, 17.286149599), align=None)
        Polygon((-5.4895041823, 16.8949566491), (-6.4165551654, 19.748126198), (-7.557822985, 19.3773058048), (-6.6307720019, 16.5241362559), align=None)
    extrude(amount=F6_DEPTH)


solid = f1.part
